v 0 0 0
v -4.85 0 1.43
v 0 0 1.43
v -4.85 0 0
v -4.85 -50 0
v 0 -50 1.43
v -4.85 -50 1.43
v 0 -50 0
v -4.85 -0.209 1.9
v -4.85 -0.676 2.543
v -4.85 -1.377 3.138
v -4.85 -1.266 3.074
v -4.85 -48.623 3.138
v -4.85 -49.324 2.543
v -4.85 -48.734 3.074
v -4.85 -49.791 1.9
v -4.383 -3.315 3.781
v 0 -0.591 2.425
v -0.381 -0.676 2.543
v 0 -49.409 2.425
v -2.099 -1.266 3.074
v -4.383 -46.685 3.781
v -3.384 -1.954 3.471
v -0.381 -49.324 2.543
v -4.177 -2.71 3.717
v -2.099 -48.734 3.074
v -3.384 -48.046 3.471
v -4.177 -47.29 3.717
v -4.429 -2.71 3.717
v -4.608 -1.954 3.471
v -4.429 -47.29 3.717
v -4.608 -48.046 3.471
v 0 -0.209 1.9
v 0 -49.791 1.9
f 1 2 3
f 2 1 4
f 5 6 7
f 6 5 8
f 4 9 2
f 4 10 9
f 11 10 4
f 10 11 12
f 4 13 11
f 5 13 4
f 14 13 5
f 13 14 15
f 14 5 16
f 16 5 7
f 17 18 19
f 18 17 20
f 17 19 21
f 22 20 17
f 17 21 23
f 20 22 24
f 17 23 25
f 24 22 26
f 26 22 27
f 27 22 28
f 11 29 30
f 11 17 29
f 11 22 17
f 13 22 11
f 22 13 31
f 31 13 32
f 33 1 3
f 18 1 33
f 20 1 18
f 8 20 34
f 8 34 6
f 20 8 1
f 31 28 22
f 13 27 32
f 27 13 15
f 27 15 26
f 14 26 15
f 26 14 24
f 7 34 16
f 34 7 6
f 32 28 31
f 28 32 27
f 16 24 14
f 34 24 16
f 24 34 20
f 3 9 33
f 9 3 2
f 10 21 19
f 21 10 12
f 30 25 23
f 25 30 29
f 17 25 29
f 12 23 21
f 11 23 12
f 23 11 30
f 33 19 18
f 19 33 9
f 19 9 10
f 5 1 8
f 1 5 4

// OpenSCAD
// file: long_bow_tie.scad
tilt_level = 1.1;

include <include.scad>;
include <globals.scad>;

obj_leg = 12;

max_width=scaled_male_dove_max_width();
min_width=scaled_male_dove_min_width();
depth=scaled_male_dove_depth();
length = 50;

module bow_tie_master(length){
	union(){
		mirror([0,1,0])	dovetail_3d(max_width, min_width, depth, length);
		dovetail_3d(max_width, min_width, depth, length);
	}
}

module long_bow_tie(length) {
    translate([0,0,depth]) intersection(){
        rotate([90,0,0]) bow_tie_master(length);
        rotate([90,0,0]) cylinder(r=5.8, h=200);
    }
}

long_bow_tie(length);
// file: globals.scad
/*
Most things in this file is represented as one millimeter, so keep that in mind while changing things.
Some of the setting are not mm but at variables that you can set, such as 2*x=2x and you are setting what x is.
I will try to specify when things are variables and not exact measurements.
*/

// printer slop
slop = 0.15;

obj_leg = 30;
leg_length = 5.5;
small_number = 0.001;
metal_core_rode_global = 5;


///////////////// number of holes /////////////////////
z_hole_number = 8;
other_holes = 8;

///////////////// Pins /////////////////////

//pins that poke out
ball_size = 10;
pin_height = 20;
pin_diameter = 6;


//holes
hole_ball_size = ball_size;
hole_pin_height = pin_height;
hole_pin_diameter = pin_diameter;

///////////////// Z THINGS /////////////////////

berring_slot_width = 7.5;
berring_slot_depth = 6.5;
metal_core_rode = 5;

///////////////// X THINGS /////////////////////

//male dove tails
male_dove_max_width=8;
male_dove_min_width=5;
male_dove_depth=5;
male_dove_height=obj_leg/2;

function scaled_male_dove_max_width() = male_dove_max_width - slop;
function scaled_male_dove_min_width() = male_dove_min_width - slop;
function scaled_male_dove_depth() = male_dove_depth - slop;

//female dove tails, this is found on the y mounts
girl_max_width=11;
girl_min_width=5;
girl_depth=5;
girl_height=obj_leg;


///////////////// Y THINGS /////////////////////
/*
The Y is so normal that all of those global variables at the top should change all of the setting in it, this section is set her incase there are variables set in the future development of this project.
*/

// stepper
motor_side_length = 43.2;
motor_bolt_hole_distance = 31;
motor_center_hole = 23;
motor_shaft_dia = 5;
motor_shaft_hole_dia = 5+2*slop;

// bolts etc.
bolt_hole_dia = 3+2*slop;
bolt_head_hole_dia = 5.8;

m4_bolt_hole_dia = 4+2*slop;
m4_bolt_head_hole_dia = 6.8+2*slop;


m3_nut_side = 5.65;
m4_nut_side = 6.85;

// threaded rod
lifter_rod_diam = 9.86;
hole_threaded_rod = lifter_rod_diam+2*slop;
// file: long_tie.scad
length = 50;

include <include.scad>;
include <globals.scad>;

use <long_bow_tie.scad>;

$fn=30;
module end(){
    difference() {
        translate([-4, -5, -0.2]) cube([8, 5, 6]);
        translate([0, 0, -0.5])cylinder(r=3.8, h=7);
    }
}

module tie(length) {
    translate([0,0,scaled_male_dove_depth()]) rotate([0,180,0]) difference(){
        long_bow_tie(length);
        translate([-5,-length-1,scaled_male_dove_depth()]) cube([10,length+2,male_dove_depth]);
    }
}

module long_tie(length=50) {
    difference () {
        tie(length);
        translate([0, -(length -3.5), 0]) end();
        translate([0, -3.5, 0]) rotate([0,0,180]) end();
    }
}

long_tie(length);
// main file
use <long_tie.scad>;
length=50;

rotate([0,-90,0]) intersection() {
    long_tie(length);
    translate([0,-length,0]) cube([5,length,5]);
}
